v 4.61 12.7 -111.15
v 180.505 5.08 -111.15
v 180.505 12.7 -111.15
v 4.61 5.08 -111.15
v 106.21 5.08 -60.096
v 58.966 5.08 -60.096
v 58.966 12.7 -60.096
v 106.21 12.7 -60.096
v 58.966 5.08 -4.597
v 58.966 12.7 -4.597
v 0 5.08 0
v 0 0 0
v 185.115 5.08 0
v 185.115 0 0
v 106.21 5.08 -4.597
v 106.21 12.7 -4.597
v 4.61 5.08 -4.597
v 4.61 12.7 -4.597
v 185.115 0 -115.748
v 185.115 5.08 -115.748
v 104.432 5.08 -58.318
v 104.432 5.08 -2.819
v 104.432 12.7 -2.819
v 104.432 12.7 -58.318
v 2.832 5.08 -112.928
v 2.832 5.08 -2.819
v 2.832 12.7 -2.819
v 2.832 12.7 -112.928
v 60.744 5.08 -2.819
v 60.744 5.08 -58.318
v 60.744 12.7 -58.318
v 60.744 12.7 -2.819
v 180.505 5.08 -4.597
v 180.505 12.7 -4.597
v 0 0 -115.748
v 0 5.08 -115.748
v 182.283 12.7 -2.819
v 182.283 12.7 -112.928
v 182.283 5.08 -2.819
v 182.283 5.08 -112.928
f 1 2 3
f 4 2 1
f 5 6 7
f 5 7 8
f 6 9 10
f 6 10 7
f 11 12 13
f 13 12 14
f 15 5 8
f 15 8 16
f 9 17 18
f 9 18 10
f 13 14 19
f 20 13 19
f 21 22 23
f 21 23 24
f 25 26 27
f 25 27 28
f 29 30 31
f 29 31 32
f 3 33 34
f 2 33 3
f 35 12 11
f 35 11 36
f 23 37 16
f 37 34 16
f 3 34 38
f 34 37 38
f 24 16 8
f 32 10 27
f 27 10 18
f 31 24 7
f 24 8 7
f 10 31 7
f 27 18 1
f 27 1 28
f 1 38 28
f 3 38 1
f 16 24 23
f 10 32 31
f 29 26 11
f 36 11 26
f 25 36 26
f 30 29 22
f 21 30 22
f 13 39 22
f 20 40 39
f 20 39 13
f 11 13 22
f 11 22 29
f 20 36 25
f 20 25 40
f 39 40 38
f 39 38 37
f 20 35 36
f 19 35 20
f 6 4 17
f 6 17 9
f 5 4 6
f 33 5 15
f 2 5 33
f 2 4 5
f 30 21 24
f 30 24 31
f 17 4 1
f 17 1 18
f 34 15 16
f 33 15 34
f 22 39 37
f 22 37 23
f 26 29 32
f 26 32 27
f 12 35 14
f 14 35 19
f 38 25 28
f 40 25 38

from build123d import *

# Parameters (mm, degrees)
SKETCH1_W           = 185.1152
SKETCH1_H           = 115.7478
BOSS_EXTRUDE1_DEPTH = 5.08
BOSS_EXTRUDE2_DEPTH = 7.62


with BuildPart() as part:
    # Sketch1 → Boss-Extrude1 (new body)
    with BuildSketch(Plane(origin=(0, 0, 0), x_dir=(1, 0, 0), z_dir=(0, 1, 0))):
        with Locations((92.5576, 57.8739)):
            Rectangle(SKETCH1_W, SKETCH1_H)
    extrude(amount=BOSS_EXTRUDE1_DEPTH)

    # Sketch2 → Boss-Extrude2 (add)
    with BuildSketch(Plane(origin=(0, 5.08, 0), x_dir=(1, 0, 0), z_dir=(0, 1, 0))):
        Polygon((2.8321, 112.9284), (182.2831, 112.9284), (182.2831, 2.8194), (104.4321, 2.8194), (104.4321, 58.3184), (60.7441, 58.3184), (60.7441, 2.8194), (2.8321, 2.8194), align=None)
        Polygon((4.6101, 111.1504), (4.6101, 4.5974), (58.9661, 4.5974), (58.9661, 60.0964), (106.2101, 60.0964), (106.2101, 4.5974), (180.5051, 4.5974), (180.5051, 111.1504), align=None, mode=Mode.SUBTRACT)
    extrude(amount=BOSS_EXTRUDE2_DEPTH)


solid = part.part
